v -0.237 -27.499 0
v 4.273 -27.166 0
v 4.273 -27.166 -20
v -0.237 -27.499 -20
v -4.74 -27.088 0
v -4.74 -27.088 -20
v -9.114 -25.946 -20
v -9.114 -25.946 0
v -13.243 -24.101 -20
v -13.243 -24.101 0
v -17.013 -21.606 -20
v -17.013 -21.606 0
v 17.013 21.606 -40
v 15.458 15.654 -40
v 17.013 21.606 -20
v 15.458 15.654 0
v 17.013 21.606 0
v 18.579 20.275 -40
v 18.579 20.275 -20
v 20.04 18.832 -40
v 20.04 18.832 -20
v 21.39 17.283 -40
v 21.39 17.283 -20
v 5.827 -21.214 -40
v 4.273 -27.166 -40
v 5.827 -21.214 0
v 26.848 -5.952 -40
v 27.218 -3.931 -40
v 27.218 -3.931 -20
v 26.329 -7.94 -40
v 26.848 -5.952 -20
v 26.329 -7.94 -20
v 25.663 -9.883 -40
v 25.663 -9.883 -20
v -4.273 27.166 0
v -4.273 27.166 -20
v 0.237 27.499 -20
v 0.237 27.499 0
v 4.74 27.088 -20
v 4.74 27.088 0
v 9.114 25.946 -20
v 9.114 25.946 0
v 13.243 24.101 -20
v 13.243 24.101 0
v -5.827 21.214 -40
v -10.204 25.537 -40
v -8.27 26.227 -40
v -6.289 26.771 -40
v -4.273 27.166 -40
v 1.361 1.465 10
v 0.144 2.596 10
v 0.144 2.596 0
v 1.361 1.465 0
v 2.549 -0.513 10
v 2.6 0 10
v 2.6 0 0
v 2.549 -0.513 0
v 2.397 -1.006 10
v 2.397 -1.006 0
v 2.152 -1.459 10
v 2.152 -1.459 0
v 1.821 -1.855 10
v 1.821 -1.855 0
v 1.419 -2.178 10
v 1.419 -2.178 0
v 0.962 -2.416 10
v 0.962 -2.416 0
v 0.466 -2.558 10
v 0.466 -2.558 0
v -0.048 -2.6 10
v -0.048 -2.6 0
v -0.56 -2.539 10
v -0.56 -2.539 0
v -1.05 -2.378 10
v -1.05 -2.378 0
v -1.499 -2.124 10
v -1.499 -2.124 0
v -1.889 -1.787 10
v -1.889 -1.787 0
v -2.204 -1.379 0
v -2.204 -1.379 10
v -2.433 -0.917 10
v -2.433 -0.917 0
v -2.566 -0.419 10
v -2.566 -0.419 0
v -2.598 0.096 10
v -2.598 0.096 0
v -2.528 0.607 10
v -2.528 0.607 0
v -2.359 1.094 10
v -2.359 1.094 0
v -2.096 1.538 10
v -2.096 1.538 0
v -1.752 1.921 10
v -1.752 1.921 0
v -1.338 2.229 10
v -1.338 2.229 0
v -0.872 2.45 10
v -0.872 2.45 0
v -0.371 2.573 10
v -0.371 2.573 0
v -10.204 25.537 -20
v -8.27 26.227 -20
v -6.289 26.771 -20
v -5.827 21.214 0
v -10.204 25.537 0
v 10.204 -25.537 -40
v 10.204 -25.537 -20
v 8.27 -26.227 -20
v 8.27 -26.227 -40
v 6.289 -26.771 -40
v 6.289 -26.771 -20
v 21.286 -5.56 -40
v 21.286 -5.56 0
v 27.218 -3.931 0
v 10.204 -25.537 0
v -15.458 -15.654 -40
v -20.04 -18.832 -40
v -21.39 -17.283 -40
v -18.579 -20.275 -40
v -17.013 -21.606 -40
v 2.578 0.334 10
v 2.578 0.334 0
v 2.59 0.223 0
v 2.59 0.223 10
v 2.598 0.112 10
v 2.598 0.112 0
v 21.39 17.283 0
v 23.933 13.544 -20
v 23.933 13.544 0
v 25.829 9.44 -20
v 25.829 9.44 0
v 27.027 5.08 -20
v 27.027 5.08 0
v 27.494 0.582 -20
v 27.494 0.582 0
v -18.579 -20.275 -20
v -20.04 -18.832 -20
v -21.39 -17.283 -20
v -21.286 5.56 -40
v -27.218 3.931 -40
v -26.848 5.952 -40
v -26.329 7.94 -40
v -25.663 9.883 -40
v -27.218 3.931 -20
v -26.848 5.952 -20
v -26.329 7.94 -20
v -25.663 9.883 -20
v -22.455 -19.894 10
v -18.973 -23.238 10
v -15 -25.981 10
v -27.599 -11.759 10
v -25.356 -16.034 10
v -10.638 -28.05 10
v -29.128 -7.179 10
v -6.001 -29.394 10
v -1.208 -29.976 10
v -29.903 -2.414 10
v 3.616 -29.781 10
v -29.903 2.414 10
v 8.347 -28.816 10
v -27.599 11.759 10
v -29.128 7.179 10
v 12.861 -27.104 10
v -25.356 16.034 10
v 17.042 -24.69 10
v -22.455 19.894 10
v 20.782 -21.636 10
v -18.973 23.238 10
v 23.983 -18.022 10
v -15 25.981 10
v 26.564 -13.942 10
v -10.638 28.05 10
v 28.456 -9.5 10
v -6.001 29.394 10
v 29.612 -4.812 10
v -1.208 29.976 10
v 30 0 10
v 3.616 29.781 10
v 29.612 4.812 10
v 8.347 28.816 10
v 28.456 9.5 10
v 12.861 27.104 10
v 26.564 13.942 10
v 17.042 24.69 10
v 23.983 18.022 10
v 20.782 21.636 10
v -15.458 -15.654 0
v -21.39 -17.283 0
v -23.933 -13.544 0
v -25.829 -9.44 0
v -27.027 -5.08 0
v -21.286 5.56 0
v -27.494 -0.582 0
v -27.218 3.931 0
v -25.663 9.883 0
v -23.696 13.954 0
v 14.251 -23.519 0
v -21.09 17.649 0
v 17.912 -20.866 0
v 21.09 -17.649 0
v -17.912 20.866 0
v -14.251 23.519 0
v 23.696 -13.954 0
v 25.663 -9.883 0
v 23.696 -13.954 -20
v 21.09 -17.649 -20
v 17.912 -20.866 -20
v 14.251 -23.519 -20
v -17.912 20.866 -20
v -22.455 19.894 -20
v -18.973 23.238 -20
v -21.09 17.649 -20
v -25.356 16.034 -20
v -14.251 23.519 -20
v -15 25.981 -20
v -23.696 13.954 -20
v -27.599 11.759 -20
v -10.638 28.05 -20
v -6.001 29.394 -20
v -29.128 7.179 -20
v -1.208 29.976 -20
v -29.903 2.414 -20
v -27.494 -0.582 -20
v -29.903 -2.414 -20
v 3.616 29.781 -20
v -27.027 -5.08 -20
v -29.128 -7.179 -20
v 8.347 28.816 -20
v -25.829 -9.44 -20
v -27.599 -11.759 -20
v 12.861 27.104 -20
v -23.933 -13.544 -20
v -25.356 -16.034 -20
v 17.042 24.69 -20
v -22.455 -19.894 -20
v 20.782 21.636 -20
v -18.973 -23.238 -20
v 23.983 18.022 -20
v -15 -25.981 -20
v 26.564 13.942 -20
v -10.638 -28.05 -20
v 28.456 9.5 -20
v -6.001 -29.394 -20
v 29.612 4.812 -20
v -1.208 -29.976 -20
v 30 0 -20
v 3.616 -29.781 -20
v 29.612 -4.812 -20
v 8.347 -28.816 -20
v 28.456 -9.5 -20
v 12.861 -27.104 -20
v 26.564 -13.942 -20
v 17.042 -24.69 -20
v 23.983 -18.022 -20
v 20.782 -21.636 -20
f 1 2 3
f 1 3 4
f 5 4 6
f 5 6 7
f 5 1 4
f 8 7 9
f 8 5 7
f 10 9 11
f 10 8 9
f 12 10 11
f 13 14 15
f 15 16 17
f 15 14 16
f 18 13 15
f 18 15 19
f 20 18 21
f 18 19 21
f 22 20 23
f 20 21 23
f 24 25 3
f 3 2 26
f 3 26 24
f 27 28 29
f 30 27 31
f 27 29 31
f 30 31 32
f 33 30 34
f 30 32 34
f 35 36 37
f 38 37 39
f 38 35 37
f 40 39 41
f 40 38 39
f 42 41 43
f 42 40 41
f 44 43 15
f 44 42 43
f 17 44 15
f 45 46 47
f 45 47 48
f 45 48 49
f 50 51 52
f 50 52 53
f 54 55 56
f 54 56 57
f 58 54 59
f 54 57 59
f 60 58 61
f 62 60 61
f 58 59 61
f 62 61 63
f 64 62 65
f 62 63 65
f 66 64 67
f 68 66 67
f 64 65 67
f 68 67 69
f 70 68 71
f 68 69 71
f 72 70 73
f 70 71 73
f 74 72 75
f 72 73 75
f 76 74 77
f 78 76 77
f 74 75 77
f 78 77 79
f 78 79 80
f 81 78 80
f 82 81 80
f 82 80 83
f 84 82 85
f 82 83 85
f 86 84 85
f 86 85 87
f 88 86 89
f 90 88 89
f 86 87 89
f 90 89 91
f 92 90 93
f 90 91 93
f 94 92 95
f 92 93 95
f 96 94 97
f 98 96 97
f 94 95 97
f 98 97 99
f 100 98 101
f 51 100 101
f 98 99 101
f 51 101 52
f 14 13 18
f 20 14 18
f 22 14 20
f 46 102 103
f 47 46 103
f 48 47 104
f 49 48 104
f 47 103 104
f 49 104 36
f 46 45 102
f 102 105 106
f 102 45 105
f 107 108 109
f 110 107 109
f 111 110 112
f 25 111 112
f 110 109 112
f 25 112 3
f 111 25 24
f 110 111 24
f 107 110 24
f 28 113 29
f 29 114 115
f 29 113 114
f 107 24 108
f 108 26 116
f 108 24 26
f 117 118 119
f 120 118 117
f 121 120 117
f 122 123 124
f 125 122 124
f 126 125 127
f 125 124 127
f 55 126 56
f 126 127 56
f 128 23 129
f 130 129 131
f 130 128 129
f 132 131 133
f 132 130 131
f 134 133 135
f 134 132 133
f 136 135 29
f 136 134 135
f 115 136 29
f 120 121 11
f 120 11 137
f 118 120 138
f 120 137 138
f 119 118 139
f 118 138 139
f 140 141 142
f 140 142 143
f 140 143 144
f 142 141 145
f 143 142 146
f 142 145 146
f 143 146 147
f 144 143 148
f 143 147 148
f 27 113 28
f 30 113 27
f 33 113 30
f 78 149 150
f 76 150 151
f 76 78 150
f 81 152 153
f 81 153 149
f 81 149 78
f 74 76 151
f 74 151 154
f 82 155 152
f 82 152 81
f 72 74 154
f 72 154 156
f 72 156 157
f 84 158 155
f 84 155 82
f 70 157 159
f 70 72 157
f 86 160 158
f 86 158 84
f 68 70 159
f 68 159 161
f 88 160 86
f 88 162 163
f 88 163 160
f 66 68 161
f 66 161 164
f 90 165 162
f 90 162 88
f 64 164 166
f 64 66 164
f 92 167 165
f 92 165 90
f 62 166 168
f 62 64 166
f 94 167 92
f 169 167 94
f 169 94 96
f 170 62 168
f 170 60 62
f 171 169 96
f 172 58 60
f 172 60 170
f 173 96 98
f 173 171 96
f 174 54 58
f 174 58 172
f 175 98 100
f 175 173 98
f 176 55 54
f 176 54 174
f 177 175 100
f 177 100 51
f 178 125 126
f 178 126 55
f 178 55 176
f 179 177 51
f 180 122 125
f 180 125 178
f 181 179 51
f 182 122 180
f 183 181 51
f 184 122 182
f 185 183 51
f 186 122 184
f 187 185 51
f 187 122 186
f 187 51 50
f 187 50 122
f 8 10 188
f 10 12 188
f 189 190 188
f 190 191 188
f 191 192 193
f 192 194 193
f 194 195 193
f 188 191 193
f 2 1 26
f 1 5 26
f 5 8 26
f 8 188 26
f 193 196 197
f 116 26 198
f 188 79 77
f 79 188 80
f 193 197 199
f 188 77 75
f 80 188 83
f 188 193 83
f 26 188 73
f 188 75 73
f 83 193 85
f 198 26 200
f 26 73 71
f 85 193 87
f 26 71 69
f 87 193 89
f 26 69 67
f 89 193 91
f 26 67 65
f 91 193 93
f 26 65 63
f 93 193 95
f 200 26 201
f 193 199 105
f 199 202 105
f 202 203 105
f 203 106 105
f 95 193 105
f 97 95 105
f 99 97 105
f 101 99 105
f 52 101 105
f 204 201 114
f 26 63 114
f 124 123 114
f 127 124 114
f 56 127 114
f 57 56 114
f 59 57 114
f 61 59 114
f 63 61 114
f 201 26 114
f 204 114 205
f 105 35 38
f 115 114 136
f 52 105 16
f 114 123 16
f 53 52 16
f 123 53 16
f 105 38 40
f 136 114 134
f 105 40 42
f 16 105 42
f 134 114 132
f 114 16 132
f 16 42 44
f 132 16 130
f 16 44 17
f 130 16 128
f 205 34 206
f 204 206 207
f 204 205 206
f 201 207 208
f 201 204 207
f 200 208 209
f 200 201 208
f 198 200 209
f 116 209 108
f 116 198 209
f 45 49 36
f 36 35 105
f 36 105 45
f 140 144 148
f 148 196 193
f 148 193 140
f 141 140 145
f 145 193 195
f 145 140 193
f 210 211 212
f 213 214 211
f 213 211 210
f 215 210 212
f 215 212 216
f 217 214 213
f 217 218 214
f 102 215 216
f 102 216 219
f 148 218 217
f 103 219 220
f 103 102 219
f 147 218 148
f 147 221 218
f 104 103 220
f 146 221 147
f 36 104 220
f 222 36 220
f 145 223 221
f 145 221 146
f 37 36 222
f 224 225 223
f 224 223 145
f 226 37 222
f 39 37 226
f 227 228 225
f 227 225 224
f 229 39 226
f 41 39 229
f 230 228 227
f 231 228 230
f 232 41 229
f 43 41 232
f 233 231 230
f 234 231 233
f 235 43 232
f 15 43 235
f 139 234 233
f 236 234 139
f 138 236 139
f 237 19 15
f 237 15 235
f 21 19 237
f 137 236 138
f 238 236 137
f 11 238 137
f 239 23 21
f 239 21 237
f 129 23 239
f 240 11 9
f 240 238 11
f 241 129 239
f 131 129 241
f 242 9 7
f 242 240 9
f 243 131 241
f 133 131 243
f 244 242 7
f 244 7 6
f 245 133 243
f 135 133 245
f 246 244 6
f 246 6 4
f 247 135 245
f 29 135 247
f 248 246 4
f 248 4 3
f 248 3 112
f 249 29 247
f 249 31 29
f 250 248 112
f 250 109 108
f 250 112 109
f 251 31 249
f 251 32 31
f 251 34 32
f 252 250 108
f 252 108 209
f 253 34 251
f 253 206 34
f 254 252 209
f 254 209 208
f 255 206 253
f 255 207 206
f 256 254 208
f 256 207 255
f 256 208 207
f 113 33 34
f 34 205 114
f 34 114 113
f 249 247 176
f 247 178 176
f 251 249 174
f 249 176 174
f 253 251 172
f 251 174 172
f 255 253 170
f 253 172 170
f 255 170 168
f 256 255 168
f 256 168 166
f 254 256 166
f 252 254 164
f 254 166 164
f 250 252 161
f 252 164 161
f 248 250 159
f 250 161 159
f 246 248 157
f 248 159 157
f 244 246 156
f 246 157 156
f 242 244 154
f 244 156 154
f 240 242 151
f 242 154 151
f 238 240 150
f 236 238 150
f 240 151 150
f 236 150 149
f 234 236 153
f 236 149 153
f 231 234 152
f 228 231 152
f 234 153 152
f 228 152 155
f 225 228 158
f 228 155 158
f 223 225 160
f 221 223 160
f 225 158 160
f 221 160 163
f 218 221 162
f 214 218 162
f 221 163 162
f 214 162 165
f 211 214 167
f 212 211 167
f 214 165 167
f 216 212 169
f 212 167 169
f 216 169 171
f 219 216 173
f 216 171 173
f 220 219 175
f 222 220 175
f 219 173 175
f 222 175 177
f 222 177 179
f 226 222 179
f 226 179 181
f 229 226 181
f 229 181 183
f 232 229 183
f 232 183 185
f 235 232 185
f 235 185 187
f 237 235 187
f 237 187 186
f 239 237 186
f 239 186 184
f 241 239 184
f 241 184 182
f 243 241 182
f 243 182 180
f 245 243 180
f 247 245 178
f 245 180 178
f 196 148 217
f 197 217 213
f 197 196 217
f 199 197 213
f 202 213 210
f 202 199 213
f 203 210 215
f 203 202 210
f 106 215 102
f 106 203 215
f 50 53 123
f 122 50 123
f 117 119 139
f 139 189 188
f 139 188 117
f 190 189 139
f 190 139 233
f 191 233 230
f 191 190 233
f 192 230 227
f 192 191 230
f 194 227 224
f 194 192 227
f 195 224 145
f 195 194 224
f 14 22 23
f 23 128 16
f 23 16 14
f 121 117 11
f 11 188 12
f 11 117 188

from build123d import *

# Parameters (mm, degrees)
F1_R     = 30
F2_DEPTH = 10
F5_DEPTH = 40
F3_R     = 30
F3_R_2   = 27.5
F6_DEPTH = 20


with BuildPart() as f2:
    # F1 (on face) → F2 (new body)
    with BuildSketch(Plane.XY):
        Circle(F1_R)
        with BuildLine():
            ThreePointArc((2.6, 0), (-1.8887723072, -1.7867678001), (0.1442006372, 2.5959981079))
            Line((0.1442006372, 2.5959981079), (1.3613009588, 1.465216605))
            Line((1.3613009588, 1.465216605), (2.5784012803, 0.3344351021))
            ThreePointArc((2.5784012803, 0.3344351021), (2.5945947014, 0.1675659141), (2.6, 0))
        make_face(mode=Mode.SUBTRACT)
    extrude(amount=F2_DEPTH)

    # F4 (on face) → F5 (join)
    with BuildSketch(Plane(origin=(0, 0, 0), x_dir=(1, 0, 0), z_dir=(0, 0, -1))):
        with BuildLine():
            Line((25.6627975095, 9.8828550524), (21.2857162159, 5.5604213128))
            Line((21.2857162159, 5.5604213128), (27.2175942873, 3.9309745879))
            ThreePointArc((27.2175942873, 3.9309745879), (26.6071452699, 6.950526641), (25.6627975095, 9.8828550524))
        make_face()
        with BuildLine():
            Line((21.390202292, -17.2832070492), (15.4583242206, -15.6537603243))
            Line((15.4583242206, -15.6537603243), (17.0131209984, -21.6056407888))
            ThreePointArc((17.0131209984, -21.6056407888), (19.3229052758, -19.5672004054), (21.390202292, -17.2832070492))
        make_face()
        with BuildLine():
            Line((4.2725952175, 27.1660621016), (5.8273919953, 21.2141816371))
            Line((5.8273919953, 21.2141816371), (10.2044732889, 25.5366153767))
            ThreePointArc((10.2044732889, 25.5366153767), (7.2842399941, 26.5177270464), (4.2725952175, 27.1660621016))
        make_face()
        with BuildLine():
            Line((-4.2725952175, -27.1660621016), (-5.8273919953, -21.2141816371))
            Line((-5.8273919953, -21.2141816371), (-10.2044732889, -25.5366153767))
            ThreePointArc((-10.2044732889, -25.5366153767), (-7.2842399941, -26.5177270464), (-4.2725952175, -27.1660621016))
        make_face()
        with BuildLine():
            Line((-21.390202292, 17.2832070492), (-15.4583242206, 15.6537603243))
            Line((-15.4583242206, 15.6537603243), (-17.0131209984, 21.6056407888))
            ThreePointArc((-17.0131209984, 21.6056407888), (-19.3229052758, 19.5672004054), (-21.390202292, 17.2832070492))
        make_face()
        with BuildLine():
            Line((-25.6627975095, -9.8828550524), (-21.2857162159, -5.5604213128))
            Line((-21.2857162159, -5.5604213128), (-27.2175942873, -3.9309745879))
            ThreePointArc((-27.2175942873, -3.9309745879), (-26.6071452699, -6.950526641), (-25.6627975095, -9.8828550524))
        make_face()
    extrude(amount=F5_DEPTH)

    # F3 (on face) → F6 (join)
    with BuildSketch(Plane(origin=(0, 0, 0), x_dir=(1, 0, 0), z_dir=(0, 0, -1))):
        Circle(F3_R)
        Circle(F3_R_2, mode=Mode.SUBTRACT)
    extrude(amount=F6_DEPTH)


solid = f2.part
